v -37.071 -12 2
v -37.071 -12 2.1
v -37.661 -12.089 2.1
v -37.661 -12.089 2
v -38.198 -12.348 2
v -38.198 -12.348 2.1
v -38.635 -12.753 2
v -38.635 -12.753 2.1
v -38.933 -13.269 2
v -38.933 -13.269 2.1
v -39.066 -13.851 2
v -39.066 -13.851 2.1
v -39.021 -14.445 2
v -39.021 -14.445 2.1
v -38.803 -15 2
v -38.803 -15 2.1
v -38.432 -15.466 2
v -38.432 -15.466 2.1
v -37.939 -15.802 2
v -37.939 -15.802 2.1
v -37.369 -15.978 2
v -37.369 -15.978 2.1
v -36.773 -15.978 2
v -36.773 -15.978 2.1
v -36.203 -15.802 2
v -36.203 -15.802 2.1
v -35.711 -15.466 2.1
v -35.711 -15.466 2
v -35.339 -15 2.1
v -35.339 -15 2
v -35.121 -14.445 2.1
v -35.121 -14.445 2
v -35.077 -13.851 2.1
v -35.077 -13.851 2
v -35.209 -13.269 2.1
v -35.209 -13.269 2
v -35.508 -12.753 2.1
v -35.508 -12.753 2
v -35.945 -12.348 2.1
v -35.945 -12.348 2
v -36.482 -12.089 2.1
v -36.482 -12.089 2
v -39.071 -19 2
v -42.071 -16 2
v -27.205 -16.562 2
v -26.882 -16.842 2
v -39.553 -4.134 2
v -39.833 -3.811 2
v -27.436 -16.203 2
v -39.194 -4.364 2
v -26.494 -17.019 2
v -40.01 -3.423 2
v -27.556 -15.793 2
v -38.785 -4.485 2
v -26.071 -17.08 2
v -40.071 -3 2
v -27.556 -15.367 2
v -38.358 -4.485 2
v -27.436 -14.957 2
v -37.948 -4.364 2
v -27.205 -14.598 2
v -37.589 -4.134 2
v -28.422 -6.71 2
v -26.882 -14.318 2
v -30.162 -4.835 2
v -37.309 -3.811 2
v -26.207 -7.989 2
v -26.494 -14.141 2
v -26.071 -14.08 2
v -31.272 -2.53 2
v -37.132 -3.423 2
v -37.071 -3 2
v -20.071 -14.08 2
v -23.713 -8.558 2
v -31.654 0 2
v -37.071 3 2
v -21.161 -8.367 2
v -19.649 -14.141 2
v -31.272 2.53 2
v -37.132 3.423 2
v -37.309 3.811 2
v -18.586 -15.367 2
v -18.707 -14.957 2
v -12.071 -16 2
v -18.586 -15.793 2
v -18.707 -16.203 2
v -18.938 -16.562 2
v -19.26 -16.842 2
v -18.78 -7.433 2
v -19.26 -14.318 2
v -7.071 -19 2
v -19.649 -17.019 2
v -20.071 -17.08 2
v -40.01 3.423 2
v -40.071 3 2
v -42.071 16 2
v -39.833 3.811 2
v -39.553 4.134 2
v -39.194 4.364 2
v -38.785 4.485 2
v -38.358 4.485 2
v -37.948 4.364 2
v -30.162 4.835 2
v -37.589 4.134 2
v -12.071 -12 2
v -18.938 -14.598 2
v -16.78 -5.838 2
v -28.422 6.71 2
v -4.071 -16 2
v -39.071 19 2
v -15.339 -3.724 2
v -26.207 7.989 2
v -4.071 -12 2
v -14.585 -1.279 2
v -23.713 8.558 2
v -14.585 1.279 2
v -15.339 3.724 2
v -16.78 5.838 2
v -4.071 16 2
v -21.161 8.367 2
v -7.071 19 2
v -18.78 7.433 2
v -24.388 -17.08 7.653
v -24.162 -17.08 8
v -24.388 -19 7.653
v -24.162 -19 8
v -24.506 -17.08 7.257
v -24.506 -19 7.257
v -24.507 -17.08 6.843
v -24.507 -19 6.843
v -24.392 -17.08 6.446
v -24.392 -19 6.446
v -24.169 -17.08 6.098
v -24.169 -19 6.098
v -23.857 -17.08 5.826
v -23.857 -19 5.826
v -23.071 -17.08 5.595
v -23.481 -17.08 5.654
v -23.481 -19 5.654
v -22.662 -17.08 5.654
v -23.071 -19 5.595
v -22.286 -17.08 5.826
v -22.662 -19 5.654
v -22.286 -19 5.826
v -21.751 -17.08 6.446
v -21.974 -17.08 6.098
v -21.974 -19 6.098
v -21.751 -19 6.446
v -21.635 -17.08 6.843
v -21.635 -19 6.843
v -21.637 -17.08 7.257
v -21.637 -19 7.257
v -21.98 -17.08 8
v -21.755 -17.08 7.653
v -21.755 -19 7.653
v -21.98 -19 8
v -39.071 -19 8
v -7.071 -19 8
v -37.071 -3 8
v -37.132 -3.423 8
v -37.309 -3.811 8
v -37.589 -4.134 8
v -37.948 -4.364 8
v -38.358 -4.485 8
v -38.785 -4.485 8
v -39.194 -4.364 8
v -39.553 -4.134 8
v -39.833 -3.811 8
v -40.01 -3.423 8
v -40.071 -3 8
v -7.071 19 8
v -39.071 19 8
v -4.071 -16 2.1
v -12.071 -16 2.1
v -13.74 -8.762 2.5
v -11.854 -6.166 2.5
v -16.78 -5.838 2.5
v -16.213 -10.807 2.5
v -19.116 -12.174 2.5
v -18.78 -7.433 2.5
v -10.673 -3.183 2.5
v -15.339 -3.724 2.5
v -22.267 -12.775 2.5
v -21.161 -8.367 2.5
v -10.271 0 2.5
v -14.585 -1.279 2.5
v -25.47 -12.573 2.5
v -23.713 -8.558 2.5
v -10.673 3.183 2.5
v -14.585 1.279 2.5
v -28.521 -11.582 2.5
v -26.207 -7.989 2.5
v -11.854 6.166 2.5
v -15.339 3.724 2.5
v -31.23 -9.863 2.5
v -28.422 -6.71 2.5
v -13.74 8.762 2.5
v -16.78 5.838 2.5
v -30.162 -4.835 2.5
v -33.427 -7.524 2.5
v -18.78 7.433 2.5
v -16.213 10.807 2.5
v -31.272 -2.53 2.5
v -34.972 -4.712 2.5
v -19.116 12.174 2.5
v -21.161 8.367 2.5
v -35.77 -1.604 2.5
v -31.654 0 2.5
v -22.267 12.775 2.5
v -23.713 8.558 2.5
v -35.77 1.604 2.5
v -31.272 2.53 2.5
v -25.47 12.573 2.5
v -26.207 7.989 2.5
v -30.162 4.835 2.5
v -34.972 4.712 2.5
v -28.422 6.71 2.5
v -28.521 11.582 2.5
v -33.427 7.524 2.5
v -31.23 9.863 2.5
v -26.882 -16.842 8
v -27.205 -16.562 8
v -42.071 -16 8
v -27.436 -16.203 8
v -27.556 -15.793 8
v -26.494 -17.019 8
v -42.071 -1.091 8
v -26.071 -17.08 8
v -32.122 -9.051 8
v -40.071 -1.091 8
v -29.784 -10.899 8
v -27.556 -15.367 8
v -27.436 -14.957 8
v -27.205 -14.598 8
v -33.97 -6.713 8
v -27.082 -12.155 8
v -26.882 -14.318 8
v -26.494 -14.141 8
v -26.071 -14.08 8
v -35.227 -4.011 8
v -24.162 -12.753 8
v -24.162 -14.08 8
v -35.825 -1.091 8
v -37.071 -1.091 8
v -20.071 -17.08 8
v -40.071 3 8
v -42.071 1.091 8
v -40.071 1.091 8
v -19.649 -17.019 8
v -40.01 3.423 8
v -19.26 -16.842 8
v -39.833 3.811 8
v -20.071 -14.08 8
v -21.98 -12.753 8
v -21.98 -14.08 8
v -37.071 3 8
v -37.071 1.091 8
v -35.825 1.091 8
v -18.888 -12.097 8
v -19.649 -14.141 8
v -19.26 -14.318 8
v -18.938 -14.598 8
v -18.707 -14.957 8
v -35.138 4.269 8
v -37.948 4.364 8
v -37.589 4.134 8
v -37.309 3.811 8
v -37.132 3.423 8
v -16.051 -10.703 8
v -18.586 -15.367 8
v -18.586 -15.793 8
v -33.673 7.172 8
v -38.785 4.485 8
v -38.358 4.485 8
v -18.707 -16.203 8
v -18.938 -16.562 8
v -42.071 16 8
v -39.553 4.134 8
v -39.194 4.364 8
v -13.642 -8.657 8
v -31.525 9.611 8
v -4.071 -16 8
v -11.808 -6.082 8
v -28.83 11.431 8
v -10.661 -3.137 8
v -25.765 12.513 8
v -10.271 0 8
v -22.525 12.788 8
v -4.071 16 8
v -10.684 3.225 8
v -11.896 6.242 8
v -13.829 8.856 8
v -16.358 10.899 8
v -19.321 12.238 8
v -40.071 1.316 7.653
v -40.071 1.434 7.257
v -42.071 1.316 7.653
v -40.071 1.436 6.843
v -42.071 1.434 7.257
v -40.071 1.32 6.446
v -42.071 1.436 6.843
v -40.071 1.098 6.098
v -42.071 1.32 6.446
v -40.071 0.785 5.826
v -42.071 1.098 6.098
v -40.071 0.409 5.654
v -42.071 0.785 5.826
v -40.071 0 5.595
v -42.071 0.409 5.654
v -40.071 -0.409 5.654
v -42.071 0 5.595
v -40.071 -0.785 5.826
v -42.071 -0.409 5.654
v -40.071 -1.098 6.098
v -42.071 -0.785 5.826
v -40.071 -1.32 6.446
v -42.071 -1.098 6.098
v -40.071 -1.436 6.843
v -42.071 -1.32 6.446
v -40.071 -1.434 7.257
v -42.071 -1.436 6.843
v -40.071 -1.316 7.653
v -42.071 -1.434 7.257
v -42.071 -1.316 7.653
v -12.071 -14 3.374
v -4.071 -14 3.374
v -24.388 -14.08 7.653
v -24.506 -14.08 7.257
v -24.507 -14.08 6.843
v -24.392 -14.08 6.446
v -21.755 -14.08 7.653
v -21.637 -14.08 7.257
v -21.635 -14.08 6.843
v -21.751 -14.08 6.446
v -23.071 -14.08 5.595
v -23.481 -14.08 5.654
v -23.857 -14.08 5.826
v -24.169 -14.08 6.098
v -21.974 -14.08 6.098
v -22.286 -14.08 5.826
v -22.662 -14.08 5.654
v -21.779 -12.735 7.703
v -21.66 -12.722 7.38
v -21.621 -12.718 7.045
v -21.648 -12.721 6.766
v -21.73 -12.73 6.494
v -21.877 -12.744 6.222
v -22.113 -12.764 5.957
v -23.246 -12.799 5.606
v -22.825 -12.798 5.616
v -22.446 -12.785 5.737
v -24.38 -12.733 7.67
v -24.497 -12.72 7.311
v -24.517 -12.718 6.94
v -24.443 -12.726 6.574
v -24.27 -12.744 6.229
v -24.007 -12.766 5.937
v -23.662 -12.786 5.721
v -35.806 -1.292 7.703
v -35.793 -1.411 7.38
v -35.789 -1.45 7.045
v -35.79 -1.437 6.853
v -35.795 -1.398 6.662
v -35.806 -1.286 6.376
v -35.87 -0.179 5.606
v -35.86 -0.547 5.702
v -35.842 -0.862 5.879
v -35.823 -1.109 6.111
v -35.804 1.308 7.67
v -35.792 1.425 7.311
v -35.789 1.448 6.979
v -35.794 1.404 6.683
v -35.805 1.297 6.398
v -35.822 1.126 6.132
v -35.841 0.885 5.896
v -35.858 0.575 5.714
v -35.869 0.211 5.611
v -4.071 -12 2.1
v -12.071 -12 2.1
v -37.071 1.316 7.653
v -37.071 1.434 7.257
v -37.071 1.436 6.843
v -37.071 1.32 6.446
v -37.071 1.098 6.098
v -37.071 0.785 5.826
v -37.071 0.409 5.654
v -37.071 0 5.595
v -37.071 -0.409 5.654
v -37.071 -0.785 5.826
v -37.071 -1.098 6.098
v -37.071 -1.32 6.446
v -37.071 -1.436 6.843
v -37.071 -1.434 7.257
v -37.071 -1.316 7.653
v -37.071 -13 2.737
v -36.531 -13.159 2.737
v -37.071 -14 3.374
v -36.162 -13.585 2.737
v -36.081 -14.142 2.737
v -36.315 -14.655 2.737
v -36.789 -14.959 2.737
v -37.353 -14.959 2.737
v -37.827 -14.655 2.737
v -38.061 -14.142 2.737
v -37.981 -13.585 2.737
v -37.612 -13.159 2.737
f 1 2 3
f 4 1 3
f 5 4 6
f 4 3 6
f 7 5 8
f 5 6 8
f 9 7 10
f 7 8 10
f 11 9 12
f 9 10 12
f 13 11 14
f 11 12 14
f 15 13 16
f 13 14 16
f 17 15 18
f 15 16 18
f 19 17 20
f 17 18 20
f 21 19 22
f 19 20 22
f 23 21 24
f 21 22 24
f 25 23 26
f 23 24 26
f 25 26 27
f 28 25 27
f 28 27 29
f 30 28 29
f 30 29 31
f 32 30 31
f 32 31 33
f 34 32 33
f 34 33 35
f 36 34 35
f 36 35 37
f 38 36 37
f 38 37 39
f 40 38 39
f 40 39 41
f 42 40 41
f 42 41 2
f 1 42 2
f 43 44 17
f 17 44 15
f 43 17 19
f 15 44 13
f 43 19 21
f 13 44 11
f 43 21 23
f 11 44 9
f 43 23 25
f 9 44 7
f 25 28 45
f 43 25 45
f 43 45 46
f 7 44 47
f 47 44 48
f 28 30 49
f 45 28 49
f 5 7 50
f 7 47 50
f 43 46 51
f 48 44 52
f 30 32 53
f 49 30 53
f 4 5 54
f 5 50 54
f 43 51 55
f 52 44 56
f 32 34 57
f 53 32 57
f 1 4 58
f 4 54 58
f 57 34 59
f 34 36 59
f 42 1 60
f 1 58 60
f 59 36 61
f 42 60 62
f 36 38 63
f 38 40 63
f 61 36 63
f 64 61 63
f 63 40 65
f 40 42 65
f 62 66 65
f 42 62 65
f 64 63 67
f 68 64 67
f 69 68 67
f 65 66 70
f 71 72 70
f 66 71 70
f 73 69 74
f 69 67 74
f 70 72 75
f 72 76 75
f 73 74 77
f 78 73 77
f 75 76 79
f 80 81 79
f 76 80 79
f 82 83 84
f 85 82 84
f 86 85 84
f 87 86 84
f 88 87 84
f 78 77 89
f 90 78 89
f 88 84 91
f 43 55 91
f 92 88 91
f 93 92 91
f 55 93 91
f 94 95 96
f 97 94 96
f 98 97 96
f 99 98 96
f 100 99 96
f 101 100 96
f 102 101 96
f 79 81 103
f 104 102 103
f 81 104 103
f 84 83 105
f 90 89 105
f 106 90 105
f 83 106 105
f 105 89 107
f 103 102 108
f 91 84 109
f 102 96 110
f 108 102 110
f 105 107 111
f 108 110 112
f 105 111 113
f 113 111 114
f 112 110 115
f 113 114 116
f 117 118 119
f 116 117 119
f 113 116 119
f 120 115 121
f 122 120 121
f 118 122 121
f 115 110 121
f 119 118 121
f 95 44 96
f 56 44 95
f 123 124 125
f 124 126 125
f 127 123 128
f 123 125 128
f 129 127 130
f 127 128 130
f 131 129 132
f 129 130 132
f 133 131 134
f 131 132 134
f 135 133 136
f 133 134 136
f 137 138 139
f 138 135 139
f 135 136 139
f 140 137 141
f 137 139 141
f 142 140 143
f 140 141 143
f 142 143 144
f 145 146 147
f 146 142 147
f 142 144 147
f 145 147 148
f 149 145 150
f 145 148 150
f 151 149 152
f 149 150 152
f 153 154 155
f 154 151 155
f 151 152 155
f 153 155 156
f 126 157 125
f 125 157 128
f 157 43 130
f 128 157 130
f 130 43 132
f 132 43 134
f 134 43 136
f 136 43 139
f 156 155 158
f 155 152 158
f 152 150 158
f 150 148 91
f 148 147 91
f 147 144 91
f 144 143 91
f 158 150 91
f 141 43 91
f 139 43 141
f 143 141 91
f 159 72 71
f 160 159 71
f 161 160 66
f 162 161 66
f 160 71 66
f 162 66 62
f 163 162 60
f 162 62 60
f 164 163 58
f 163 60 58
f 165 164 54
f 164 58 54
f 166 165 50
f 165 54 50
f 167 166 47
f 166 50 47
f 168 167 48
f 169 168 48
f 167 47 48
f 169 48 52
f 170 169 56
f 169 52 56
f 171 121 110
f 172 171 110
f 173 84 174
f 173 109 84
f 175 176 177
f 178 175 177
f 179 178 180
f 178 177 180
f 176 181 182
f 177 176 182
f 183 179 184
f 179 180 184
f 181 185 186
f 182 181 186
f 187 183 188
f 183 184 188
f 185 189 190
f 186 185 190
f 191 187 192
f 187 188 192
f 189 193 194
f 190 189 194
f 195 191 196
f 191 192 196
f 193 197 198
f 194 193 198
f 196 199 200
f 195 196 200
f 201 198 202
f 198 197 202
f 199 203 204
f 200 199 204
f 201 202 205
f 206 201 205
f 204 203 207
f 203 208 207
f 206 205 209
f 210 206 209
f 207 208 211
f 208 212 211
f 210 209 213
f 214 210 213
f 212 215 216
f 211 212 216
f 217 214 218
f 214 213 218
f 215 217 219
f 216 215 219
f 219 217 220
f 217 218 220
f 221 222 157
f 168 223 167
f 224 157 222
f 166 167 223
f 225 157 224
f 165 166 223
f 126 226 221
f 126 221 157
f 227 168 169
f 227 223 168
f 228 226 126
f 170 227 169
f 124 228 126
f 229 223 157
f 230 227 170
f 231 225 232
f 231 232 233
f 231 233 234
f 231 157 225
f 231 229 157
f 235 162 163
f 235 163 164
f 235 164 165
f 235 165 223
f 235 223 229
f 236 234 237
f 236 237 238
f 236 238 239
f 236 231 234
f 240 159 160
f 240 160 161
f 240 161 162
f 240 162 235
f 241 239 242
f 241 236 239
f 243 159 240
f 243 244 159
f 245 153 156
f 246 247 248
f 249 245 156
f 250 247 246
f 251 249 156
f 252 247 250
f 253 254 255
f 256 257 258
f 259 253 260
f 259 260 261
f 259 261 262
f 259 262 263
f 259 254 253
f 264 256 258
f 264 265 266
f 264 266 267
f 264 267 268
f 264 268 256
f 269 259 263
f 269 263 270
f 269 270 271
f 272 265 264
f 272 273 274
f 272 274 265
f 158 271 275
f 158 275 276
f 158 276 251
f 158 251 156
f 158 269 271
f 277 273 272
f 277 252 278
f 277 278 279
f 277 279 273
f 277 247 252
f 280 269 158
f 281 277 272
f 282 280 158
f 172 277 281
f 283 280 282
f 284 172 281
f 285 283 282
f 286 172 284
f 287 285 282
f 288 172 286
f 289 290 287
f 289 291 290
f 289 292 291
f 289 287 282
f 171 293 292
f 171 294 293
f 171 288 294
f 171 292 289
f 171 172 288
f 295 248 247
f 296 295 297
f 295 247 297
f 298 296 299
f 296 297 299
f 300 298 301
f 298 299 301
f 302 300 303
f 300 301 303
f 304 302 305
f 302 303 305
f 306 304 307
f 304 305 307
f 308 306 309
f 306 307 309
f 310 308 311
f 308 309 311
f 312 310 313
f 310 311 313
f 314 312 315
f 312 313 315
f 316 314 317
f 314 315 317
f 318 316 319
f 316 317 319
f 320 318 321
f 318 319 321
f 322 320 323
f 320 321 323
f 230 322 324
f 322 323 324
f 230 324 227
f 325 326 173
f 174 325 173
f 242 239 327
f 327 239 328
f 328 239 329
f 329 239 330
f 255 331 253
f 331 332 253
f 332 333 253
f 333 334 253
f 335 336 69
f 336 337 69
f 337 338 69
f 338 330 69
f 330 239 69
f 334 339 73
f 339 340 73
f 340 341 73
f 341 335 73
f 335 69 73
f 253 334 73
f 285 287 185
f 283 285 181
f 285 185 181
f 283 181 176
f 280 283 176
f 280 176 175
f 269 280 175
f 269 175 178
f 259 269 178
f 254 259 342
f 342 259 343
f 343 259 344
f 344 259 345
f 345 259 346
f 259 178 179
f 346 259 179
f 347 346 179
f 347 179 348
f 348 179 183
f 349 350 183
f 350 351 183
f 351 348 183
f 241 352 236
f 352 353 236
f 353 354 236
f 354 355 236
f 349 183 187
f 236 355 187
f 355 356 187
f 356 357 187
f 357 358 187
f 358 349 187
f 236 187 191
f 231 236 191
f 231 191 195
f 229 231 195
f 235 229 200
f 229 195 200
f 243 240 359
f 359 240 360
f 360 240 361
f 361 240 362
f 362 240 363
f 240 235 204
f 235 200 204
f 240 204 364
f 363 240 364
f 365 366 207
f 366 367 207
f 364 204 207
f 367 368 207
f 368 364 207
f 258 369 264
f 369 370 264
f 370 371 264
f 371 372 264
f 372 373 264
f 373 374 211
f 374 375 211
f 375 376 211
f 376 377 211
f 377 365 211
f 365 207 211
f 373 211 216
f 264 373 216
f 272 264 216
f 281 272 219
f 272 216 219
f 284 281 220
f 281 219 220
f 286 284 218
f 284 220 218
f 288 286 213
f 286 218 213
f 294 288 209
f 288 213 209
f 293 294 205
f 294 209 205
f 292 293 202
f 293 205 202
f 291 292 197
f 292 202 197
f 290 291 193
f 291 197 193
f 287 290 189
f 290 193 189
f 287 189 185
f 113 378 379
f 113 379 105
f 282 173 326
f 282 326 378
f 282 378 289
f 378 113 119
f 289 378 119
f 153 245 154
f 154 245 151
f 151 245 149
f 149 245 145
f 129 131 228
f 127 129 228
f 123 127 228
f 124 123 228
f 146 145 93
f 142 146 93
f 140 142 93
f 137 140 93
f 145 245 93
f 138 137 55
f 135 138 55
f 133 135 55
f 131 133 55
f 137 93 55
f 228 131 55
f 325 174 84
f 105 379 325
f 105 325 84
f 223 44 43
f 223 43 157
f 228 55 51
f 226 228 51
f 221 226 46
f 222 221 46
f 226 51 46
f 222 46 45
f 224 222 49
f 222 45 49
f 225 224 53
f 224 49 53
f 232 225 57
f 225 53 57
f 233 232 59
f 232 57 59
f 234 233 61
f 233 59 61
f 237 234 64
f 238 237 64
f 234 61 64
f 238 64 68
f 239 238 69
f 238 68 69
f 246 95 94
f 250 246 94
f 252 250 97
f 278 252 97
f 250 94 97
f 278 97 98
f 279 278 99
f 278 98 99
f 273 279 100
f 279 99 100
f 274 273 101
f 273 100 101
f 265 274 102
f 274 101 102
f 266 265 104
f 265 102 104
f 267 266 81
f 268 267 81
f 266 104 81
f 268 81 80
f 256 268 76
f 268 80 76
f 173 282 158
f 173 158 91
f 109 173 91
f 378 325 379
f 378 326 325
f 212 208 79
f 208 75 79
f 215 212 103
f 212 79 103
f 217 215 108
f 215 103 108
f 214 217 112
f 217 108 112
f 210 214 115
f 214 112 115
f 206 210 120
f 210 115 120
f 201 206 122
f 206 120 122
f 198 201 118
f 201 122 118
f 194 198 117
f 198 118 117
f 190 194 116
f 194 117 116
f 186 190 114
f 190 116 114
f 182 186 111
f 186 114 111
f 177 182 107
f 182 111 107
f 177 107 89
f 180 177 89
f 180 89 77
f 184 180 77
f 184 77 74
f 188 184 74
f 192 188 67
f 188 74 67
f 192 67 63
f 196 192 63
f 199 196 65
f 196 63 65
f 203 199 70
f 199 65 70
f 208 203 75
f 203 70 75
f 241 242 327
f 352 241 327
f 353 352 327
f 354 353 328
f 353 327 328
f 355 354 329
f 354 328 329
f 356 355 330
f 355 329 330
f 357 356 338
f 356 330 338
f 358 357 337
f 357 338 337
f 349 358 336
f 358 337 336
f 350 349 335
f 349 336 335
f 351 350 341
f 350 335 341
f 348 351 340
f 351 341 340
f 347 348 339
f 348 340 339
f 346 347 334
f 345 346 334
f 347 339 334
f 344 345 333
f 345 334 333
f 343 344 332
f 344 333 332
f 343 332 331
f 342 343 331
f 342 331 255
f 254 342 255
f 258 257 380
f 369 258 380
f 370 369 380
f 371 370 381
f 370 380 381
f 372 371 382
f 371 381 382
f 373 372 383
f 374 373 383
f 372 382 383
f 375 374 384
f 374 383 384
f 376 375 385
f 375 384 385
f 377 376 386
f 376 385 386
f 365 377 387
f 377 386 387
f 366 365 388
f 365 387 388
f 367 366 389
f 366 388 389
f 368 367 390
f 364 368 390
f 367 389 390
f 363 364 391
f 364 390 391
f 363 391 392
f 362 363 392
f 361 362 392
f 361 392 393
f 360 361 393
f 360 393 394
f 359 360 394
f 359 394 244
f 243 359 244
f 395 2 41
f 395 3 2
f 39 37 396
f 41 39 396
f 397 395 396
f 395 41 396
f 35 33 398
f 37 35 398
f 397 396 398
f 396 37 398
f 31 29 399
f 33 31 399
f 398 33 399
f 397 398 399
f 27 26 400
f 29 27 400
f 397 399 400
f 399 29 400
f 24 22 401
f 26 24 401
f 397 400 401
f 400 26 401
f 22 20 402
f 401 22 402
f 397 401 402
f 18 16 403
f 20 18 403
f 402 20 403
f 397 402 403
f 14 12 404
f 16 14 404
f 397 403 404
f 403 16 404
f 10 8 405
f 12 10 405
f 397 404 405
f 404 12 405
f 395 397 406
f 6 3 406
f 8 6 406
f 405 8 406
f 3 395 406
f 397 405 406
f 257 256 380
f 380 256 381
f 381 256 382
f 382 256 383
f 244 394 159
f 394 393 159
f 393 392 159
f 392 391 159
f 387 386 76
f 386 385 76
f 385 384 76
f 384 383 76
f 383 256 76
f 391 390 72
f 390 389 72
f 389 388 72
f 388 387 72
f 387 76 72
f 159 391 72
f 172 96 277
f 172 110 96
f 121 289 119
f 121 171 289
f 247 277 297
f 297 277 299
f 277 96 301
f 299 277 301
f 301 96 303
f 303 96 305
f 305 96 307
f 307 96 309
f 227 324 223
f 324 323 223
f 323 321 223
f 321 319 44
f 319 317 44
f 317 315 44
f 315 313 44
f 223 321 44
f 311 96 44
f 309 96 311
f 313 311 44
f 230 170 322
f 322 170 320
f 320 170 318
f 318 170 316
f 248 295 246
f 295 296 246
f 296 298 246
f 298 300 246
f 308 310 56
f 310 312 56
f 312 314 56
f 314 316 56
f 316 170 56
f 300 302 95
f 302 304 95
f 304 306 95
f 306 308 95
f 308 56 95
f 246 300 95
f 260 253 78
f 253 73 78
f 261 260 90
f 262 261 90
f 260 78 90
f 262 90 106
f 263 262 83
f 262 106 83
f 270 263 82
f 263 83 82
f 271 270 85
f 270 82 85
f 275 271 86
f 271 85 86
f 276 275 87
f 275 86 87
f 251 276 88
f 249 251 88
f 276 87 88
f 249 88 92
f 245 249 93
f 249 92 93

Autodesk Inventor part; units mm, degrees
ref_plane "YZ Plane" through (0, 0, 0) normal (1, 0, 0) x (0, 1, 0)
ref_plane "XZ Plane" through (0, 0, 0) normal (0, 1, 0) x (-1, 0, 0)
ref_plane "XY Plane" through (0, 0, 0) normal (0, 0, 1) x (1, 0, 0)
ref_plane "Work Plane1" through (0, 0, 2) normal (0, 0, 1) x (1, 0, 0)
sketch "Sketch1" plane through (0, 0, 2) normal (0, 0, 1) x (1, 0, 0)
  circle A0 centre (-37.0712, 14) radius 3.25 construction
  circle A1 centre (-9.0712, -14) radius 3.25 construction
  line L0 (-21.8762, -24.9) -> (-21.8762, -17.08) construction
  line L1 (-21.8762, -17.08) -> (-20.0712, -17.08) construction
  arc A2 (-20.0712, -17.08) -> (-20.0712, -14.08) centre (-20.0712, -15.58) ccw construction
  line L2 (-20.0712, -14.08) -> (-21.8762, -14.08) construction
  line L3 (-21.8762, -14.08) -> (-21.8762, -3.0223) construction
  arc A3 (-21.8762, -3.0223) -> (-25.9925, 1.4242) centre (-23.0712, 0) ccw construction
  line L4 (-25.9925, 1.4242) -> (-37.0712, 1.4242) construction
  line L5 (-37.0712, 1.4242) -> (-37.0712, 3) construction
  arc A4 (-37.0712, 3) -> (-40.0712, 3) centre (-38.5712, 3) ccw construction
  line L6 (-40.0712, 3) -> (-40.0712, 1.4242) construction
  line L7 (-40.0712, 1.4242) -> (-47.9712, 1.4242) construction
  line L8 (-47.9712, 1.4242) -> (-47.9712, 17) construction
  line L9 (-47.9712, 17) -> (-44.3964, 17) construction
  line L10 (-44.3964, 17) -> (-40.0712, 21.3252) construction
  line L11 (-40.0712, 21.3252) -> (-40.0712, 24.9) construction
  line L12 (-40.0712, 24.9) -> (-6.0712, 24.9) construction
  line L13 (-6.0712, 24.9) -> (-6.0712, 21.3252) construction
  line L14 (-6.0712, 21.3252) -> (-1.746, 17) construction
  line L15 (-1.746, 17) -> (1.8288, 17) construction
  line L16 (1.8288, 17) -> (1.8288, -17) construction
  line L17 (1.8288, -17) -> (-1.746, -17) construction
  line L18 (-1.746, -17) -> (-6.1126, -21.3666) construction
  line L19 (-6.1126, -21.3666) -> (-6.1126, -24.9) construction
  line L20 (-6.1126, -24.9) -> (-21.8762, -24.9) construction
  circle A5 centre (-37.0712, -14) radius 3.25 construction
  circle A6 centre (-23.0712, 0) radius 12.45 construction
  circle A7 centre (-23.0712, 0) radius 12.7 construction
  line L21 (-37.0712, 14) -> (-9.0712, 14) construction
  line L22 (-9.0712, 14) -> (-9.0712, -14) construction
  line L23 (-9.0712, -14) -> (-37.0712, -14) construction
  line L24 (-37.0712, -14) -> (-37.0712, 14) construction
  line L25 (-4.0712, -19) -> (-4.0712, 19)
  line L26 (-4.0712, 19) -> (-42.0712, 19)
  line L27 (-42.0712, 19) -> (-42.0712, -19)
  line L28 (-42.0712, -19) -> (-4.0712, -19)
  circle A8 centre (-23.0712, 0) radius 12.8
  point P0 (0, 0)
  dimension "d0" = 5
  dimension "d1" = 0.1
extrude "Extrusion1" add sketch "Sketch1" along normal blind 6
sketch "Sketch2" plane through (0, 0, 2) normal (0, 0, -1) x (-1, 0, 0)
  circle A0 centre (23.0712, 0) radius 12.8 projected
  circle A1 centre (23.0712, 0) radius 8.5824
  point P0 (0, 0)
extrude "Extrusion2" add sketch "Sketch2" against normal blind 0.5
sketch "Sketch3" plane through (0, 0, 2) normal (0, 0, -1) x (-1, 0, 0)
  circle A0 centre (9.0712, -14) radius 1.45 construction
  circle A1 centre (9.0712, -14) radius 2.45
  circle A2 centre (37.0712, -14) radius 1.45 projected
  circle A3 centre (37.0712, -14) radius 1.95
  point P0 (0, 0)
  dimension "d8" = 1
  dimension "d10" = 0.5
sketch "Sketch5" plane through (0, 0, 2) normal (0, 0, -1) x (-1, 0, 0)
  arc A0 (20.0712, -14.08) -> (20.0712, -17.08) centre (20.0712, -15.58) ccw projected
  arc A1 (26.0712, -17.08) -> (26.0712, -14.08) centre (26.0712, -15.58) ccw projected
  line L0 (37.0712, 3) -> (37.0712, -3) projected
  arc A2 (37.0712, -3) -> (40.0712, -3) centre (38.5712, -3) ccw projected
  line L1 (40.0712, -3) -> (40.0712, 3) projected
  arc A3 (40.0712, 3) -> (37.0712, 3) centre (38.5712, 3) ccw projected
  line L2 (26.0712, -14.08) -> (20.0712, -14.08) projected
  arc A4 (20.0712, -14.08) -> (20.0712, -17.08) centre (20.0712, -15.58) ccw projected
  line L3 (20.0712, -17.08) -> (26.0712, -17.08) projected
  arc A5 (26.0712, -17.08) -> (26.0712, -14.08) centre (26.0712, -15.58) ccw projected
  circle A6 centre (37.0712, -14) radius 1.45 projected
  circle A7 centre (23.0712, 0) radius 1.45 projected
  circle A8 centre (9.0712, -14) radius 1.45 projected
  circle A9 centre (37.0712, 14) radius 1.45 projected
  line L4 (-1.8288, -17) -> (-1.8288, 17) projected
  line L5 (-1.8288, 17) -> (1.746, 17) projected
  line L6 (1.746, 17) -> (6.0712, 21.3252) projected
  line L7 (6.0712, 21.3252) -> (6.0712, 24.9) projected
  line L8 (6.0712, 24.9) -> (40.0712, 24.9) projected
  line L9 (40.0712, 24.9) -> (40.0712, 21.3252) projected
  line L10 (40.0712, 21.3252) -> (44.3964, 17) projected
  line L11 (44.3964, 17) -> (47.9712, 17) projected
  line L12 (47.9712, 17) -> (47.9712, -17) projected
  line L13 (44.3964, -17) -> (47.9712, -17) projected
  line L14 (40.0712, -21.3252) -> (44.3964, -17) projected
  line L15 (40.0712, -24.9) -> (40.0712, -21.3252) projected
  line L16 (6.1126, -24.9) -> (40.0712, -24.9) projected
  line L17 (6.1126, -24.9) -> (6.1126, -21.3666) projected
  line L18 (6.1126, -21.3666) -> (1.746, -17) projected
  line L19 (1.746, -17) -> (-1.8288, -17) projected
  point P0 (0, 0)
  point P1 (40.0712, -3)
extrude "Extrusion5" cut sketch "Sketch5" against normal blind 8 contours L2 A1 L3 A0 | A3 L1 A2 L0
sketch "Sketch6" plane through (-42.0712, -19, 8) normal (0, -1, 0) x (1, 0, 0)
  line L0 (0, -6) -> (38, -6) projected
  line L1 (38, -6) -> (38, 0) projected
  line L2 (0, 0) -> (38, 0) projected
  line L3 (0, -6) -> (0, 0) projected
  line L4 (31.8, 0) -> (31.8, 0) projected
  circle A0 centre (19, -0.9548) radius 1.45
  point P0 (42.0712, -8)
  point P1 (4.5, 0)
  dimension "d34" = 2.9
extrude "Extrusion6" cut sketch "Sketch6" against normal blind 8 contours A0 L2 | L2 A0
pattern_circular "Circular Pattern1" count 2 over 90 about axis through (-23.0712, 0, 2) along (0, 0, -1) of "Extrusion6"
chamfer "Chamfer1" distance 3 angle 45 4 edges at (-42.0712, 19, 5) (-4.0712, 19, 5) (-4.0712, -19, 5) (-42.0712, -19, 5)
hole "Hole1" at (-37.0712, -14, 2) direction (0, 0, 1) diameter 4 depth 0.1 tip angle 115
sketch "Sketch4" plane through (-4.0712, -19, 2) normal (1, 0, 0) x (0, 0, -1)
  line L0 (2, 4.45) -> (6, 4.45)
  line L1 (2, 1.55) -> (6, 1.55)
  line L2 (0, 0) -> (0, 38) projected
  arc A0 (2, 19) -> (2, 19) centre (1.5, 4.4206) ccw projected
  line L3 (-1.3741, 5) -> (-0.1, 7) projected
  line L4 (-1.3741, 5) -> (-0.1, 3) projected
  line L5 (-0.1, 7) -> (0.6045, 7)
  line L6 (0.6045, 7) -> (0.6045, 3)
  line L7 (0.6045, 3) -> (-0.1, 3)
  line L8 (-0.1, 3) -> (-0.1, 7)
extrude "Extrusion4" cut sketch "Sketch4" against normal blind 8 contours L7 L8 L5 L2 | L2 L5 L6 L7 | L4 L3 L8
properties part number "20_Cube_Insert_Kinematic_Mirrormount_90_pro_v3"
